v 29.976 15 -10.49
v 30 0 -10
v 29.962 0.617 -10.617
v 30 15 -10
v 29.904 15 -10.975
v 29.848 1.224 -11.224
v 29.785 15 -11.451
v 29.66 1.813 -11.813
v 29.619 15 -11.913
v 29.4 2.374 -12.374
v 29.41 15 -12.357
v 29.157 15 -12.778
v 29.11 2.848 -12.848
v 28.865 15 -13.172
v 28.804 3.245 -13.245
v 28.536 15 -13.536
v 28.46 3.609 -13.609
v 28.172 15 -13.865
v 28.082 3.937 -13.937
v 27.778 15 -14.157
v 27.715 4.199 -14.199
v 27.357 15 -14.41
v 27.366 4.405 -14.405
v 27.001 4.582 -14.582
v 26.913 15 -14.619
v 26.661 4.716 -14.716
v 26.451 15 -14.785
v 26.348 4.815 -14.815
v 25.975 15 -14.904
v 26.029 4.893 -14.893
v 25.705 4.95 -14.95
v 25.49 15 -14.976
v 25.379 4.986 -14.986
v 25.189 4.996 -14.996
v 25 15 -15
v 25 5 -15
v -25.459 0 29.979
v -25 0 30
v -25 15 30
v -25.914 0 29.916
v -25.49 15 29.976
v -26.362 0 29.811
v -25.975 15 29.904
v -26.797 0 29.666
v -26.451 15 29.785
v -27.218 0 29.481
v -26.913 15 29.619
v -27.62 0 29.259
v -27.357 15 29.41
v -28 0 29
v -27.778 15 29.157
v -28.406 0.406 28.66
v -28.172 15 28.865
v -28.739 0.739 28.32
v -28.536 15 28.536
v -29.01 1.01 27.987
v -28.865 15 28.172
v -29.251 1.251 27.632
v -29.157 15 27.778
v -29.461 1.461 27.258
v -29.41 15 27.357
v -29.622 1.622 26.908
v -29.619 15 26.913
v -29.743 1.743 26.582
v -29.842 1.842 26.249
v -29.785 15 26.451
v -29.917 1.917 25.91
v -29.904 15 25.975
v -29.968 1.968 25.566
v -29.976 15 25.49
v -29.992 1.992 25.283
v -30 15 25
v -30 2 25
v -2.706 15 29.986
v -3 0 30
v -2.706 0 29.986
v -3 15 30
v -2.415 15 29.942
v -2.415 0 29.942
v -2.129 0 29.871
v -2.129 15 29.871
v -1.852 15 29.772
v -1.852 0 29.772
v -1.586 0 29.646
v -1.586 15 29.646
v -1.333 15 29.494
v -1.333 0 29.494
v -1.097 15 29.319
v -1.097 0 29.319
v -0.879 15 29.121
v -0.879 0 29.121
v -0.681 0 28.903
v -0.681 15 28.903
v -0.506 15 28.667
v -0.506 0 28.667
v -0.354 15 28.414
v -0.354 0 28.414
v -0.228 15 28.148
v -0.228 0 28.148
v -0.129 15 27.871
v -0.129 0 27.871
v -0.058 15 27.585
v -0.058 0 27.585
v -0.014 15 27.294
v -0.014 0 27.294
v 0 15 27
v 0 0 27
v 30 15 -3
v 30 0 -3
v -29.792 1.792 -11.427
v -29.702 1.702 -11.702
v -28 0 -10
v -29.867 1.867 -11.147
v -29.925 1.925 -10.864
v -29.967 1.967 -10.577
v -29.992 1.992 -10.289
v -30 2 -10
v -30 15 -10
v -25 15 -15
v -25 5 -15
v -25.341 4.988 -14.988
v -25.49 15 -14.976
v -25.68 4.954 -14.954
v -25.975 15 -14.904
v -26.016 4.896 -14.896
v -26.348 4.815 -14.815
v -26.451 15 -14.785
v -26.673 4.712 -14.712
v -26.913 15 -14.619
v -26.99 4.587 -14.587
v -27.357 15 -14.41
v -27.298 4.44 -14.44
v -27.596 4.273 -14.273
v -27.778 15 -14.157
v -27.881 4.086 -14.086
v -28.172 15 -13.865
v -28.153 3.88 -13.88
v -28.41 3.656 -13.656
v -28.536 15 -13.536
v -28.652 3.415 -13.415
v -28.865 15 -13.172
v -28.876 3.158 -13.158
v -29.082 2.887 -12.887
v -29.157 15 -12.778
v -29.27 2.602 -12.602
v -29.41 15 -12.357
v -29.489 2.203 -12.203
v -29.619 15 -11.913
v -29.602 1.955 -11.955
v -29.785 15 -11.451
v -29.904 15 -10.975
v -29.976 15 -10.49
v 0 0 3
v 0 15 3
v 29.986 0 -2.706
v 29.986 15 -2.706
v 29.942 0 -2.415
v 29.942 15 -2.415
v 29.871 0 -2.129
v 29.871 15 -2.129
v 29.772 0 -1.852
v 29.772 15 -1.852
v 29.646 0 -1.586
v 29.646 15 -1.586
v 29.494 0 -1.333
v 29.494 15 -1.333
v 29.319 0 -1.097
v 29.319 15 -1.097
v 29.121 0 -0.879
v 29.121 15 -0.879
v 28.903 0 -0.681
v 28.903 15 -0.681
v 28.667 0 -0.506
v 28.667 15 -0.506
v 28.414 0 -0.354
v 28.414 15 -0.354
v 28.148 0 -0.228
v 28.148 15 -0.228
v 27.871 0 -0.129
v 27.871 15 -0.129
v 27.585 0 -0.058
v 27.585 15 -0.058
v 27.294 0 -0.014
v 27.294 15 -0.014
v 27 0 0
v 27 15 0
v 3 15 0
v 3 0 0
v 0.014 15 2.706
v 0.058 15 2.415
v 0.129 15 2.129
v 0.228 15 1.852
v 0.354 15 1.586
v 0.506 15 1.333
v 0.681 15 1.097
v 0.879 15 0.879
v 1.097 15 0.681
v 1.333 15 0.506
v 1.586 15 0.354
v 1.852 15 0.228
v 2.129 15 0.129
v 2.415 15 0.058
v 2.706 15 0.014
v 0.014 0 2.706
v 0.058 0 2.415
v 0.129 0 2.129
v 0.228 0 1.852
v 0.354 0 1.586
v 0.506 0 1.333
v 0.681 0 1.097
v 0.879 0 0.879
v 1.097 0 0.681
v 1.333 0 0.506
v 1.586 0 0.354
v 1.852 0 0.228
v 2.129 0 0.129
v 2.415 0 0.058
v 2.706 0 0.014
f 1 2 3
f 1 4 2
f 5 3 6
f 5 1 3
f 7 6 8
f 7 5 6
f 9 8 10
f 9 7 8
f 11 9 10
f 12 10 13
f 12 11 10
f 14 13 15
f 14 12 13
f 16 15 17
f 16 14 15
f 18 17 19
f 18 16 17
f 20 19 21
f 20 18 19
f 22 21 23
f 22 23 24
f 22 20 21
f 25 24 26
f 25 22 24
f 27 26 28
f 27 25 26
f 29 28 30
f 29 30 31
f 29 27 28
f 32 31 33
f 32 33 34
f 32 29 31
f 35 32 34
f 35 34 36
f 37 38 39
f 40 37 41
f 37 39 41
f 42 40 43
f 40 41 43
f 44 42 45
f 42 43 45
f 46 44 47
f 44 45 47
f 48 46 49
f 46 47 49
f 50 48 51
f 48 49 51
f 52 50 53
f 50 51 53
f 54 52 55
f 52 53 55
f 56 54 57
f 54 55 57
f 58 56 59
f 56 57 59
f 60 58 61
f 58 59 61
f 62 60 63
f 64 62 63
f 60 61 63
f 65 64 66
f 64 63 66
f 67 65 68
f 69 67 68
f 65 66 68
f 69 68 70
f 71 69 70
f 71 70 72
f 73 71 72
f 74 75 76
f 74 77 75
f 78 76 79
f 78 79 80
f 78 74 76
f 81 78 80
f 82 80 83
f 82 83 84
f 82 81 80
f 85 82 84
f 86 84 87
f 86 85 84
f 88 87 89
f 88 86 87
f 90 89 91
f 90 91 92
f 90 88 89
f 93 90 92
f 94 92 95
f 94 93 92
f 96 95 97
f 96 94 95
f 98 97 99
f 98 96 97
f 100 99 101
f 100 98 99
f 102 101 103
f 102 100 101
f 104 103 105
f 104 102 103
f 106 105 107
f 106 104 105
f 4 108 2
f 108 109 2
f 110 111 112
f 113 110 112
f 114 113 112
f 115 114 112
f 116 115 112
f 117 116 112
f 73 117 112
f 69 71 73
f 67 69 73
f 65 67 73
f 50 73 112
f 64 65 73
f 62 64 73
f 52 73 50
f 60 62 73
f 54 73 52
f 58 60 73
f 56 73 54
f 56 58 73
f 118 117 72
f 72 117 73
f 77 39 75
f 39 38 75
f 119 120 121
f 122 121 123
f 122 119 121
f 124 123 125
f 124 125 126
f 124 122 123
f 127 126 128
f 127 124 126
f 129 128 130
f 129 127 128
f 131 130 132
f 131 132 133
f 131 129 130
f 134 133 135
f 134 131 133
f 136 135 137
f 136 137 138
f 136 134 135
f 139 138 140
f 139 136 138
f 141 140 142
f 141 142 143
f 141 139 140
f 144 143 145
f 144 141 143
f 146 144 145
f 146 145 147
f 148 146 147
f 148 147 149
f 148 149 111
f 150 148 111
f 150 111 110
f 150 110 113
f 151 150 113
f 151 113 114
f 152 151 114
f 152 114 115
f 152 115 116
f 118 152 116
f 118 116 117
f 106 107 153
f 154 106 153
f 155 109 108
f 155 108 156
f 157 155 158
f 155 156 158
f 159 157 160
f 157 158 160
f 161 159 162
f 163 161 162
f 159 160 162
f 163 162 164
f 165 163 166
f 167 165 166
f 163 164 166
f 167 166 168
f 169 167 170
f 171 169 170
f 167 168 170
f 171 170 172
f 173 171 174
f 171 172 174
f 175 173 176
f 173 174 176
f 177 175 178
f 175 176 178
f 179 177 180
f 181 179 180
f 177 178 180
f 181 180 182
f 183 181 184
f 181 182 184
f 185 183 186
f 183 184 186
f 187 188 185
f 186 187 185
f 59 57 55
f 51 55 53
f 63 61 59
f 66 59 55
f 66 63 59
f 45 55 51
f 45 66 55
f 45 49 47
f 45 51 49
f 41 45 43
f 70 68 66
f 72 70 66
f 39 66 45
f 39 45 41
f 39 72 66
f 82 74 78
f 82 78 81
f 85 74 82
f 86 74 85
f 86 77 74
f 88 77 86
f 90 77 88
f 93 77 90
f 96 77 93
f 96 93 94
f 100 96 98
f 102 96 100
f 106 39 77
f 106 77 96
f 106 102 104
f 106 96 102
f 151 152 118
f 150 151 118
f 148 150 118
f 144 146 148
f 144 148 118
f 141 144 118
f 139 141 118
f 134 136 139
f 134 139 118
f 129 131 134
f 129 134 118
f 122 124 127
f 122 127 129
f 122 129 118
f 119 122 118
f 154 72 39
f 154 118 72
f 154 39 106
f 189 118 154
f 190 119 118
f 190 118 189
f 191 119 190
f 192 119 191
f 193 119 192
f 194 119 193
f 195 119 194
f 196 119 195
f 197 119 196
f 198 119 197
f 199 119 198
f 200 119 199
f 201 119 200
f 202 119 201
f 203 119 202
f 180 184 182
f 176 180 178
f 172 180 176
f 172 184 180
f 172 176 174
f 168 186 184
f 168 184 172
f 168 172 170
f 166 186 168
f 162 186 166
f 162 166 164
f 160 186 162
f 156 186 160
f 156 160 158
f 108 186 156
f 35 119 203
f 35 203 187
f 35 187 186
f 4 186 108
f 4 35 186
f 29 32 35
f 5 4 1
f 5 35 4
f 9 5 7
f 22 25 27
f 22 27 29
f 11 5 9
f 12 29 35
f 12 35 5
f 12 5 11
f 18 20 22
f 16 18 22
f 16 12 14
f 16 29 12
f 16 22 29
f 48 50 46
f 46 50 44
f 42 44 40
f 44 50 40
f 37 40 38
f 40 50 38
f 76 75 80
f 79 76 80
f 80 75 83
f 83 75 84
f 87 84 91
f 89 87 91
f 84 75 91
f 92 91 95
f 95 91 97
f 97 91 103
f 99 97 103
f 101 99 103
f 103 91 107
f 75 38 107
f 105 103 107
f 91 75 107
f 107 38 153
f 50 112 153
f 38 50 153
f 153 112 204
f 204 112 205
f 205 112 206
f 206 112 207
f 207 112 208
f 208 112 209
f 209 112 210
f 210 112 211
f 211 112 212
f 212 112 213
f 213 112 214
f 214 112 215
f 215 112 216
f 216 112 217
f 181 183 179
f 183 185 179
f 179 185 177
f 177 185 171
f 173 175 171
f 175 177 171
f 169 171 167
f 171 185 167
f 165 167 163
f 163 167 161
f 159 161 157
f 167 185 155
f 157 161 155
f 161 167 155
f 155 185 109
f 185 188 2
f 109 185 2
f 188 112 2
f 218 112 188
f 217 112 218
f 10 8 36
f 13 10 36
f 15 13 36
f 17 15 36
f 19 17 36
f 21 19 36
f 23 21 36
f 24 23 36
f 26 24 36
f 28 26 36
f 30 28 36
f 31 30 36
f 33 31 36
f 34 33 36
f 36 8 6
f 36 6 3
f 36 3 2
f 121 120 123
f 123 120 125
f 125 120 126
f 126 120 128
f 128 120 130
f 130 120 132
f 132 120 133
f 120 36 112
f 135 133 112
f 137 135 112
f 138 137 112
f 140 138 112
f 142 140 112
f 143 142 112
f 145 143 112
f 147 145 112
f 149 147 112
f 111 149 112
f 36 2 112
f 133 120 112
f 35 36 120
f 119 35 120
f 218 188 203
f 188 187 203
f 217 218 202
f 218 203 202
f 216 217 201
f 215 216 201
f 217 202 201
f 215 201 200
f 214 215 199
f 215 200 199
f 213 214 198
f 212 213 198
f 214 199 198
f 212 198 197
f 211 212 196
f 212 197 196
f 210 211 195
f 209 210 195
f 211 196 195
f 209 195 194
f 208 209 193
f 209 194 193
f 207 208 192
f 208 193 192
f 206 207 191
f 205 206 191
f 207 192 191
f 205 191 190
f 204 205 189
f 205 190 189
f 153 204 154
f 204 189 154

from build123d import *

# Parameters (mm, degrees)
BOSS_EXTRUDE1_DEPTH = 15
CHAMFER1_SIZE       = 5
CHAMFER2_SIZE       = 2
FILLET1_R           = 3
FILLET2_R           = 5


with BuildPart() as part:
    # Sketch1 → Boss-Extrude1 (new body)
    with BuildSketch(Plane(origin=(0, 0, 0), x_dir=(1, 0, 0), z_dir=(0, 1, 0))):
        Polygon((0, 0), (30, 0), (30, 15), (-30, 15), (-30, -30), (0, -30), align=None)
    extrude(amount=BOSS_EXTRUDE1_DEPTH)

    # Chamfer1
    chamfer1_edges = [part.edges().sort_by_distance(p)[0] for p in [
        (0, 0, -15),
    ]]
    chamfer(chamfer1_edges, length=CHAMFER1_SIZE)

    # Chamfer2
    chamfer2_edges = [part.edges().sort_by_distance(p)[0] for p in [
        (-30, 0, 10),
    ]]
    chamfer(chamfer2_edges, length=CHAMFER2_SIZE)

    # Fillet1
    fillet1_edges = [part.edges().sort_by_distance(p)[0] for p in [
        (0, 7.5, 30),
        (30, 7.5, 0),
        (0, 7.5, 0),
    ]]
    fillet(fillet1_edges, radius=FILLET1_R)

    # Fillet2
    fillet2_edges = [part.edges().sort_by_distance(p)[0] for p in [
        (30, 10, -15),
        (-30, 8.5, 30),
        (-30, 10, -15),
    ]]
    fillet(fillet2_edges, radius=FILLET2_R)


solid = part.part
